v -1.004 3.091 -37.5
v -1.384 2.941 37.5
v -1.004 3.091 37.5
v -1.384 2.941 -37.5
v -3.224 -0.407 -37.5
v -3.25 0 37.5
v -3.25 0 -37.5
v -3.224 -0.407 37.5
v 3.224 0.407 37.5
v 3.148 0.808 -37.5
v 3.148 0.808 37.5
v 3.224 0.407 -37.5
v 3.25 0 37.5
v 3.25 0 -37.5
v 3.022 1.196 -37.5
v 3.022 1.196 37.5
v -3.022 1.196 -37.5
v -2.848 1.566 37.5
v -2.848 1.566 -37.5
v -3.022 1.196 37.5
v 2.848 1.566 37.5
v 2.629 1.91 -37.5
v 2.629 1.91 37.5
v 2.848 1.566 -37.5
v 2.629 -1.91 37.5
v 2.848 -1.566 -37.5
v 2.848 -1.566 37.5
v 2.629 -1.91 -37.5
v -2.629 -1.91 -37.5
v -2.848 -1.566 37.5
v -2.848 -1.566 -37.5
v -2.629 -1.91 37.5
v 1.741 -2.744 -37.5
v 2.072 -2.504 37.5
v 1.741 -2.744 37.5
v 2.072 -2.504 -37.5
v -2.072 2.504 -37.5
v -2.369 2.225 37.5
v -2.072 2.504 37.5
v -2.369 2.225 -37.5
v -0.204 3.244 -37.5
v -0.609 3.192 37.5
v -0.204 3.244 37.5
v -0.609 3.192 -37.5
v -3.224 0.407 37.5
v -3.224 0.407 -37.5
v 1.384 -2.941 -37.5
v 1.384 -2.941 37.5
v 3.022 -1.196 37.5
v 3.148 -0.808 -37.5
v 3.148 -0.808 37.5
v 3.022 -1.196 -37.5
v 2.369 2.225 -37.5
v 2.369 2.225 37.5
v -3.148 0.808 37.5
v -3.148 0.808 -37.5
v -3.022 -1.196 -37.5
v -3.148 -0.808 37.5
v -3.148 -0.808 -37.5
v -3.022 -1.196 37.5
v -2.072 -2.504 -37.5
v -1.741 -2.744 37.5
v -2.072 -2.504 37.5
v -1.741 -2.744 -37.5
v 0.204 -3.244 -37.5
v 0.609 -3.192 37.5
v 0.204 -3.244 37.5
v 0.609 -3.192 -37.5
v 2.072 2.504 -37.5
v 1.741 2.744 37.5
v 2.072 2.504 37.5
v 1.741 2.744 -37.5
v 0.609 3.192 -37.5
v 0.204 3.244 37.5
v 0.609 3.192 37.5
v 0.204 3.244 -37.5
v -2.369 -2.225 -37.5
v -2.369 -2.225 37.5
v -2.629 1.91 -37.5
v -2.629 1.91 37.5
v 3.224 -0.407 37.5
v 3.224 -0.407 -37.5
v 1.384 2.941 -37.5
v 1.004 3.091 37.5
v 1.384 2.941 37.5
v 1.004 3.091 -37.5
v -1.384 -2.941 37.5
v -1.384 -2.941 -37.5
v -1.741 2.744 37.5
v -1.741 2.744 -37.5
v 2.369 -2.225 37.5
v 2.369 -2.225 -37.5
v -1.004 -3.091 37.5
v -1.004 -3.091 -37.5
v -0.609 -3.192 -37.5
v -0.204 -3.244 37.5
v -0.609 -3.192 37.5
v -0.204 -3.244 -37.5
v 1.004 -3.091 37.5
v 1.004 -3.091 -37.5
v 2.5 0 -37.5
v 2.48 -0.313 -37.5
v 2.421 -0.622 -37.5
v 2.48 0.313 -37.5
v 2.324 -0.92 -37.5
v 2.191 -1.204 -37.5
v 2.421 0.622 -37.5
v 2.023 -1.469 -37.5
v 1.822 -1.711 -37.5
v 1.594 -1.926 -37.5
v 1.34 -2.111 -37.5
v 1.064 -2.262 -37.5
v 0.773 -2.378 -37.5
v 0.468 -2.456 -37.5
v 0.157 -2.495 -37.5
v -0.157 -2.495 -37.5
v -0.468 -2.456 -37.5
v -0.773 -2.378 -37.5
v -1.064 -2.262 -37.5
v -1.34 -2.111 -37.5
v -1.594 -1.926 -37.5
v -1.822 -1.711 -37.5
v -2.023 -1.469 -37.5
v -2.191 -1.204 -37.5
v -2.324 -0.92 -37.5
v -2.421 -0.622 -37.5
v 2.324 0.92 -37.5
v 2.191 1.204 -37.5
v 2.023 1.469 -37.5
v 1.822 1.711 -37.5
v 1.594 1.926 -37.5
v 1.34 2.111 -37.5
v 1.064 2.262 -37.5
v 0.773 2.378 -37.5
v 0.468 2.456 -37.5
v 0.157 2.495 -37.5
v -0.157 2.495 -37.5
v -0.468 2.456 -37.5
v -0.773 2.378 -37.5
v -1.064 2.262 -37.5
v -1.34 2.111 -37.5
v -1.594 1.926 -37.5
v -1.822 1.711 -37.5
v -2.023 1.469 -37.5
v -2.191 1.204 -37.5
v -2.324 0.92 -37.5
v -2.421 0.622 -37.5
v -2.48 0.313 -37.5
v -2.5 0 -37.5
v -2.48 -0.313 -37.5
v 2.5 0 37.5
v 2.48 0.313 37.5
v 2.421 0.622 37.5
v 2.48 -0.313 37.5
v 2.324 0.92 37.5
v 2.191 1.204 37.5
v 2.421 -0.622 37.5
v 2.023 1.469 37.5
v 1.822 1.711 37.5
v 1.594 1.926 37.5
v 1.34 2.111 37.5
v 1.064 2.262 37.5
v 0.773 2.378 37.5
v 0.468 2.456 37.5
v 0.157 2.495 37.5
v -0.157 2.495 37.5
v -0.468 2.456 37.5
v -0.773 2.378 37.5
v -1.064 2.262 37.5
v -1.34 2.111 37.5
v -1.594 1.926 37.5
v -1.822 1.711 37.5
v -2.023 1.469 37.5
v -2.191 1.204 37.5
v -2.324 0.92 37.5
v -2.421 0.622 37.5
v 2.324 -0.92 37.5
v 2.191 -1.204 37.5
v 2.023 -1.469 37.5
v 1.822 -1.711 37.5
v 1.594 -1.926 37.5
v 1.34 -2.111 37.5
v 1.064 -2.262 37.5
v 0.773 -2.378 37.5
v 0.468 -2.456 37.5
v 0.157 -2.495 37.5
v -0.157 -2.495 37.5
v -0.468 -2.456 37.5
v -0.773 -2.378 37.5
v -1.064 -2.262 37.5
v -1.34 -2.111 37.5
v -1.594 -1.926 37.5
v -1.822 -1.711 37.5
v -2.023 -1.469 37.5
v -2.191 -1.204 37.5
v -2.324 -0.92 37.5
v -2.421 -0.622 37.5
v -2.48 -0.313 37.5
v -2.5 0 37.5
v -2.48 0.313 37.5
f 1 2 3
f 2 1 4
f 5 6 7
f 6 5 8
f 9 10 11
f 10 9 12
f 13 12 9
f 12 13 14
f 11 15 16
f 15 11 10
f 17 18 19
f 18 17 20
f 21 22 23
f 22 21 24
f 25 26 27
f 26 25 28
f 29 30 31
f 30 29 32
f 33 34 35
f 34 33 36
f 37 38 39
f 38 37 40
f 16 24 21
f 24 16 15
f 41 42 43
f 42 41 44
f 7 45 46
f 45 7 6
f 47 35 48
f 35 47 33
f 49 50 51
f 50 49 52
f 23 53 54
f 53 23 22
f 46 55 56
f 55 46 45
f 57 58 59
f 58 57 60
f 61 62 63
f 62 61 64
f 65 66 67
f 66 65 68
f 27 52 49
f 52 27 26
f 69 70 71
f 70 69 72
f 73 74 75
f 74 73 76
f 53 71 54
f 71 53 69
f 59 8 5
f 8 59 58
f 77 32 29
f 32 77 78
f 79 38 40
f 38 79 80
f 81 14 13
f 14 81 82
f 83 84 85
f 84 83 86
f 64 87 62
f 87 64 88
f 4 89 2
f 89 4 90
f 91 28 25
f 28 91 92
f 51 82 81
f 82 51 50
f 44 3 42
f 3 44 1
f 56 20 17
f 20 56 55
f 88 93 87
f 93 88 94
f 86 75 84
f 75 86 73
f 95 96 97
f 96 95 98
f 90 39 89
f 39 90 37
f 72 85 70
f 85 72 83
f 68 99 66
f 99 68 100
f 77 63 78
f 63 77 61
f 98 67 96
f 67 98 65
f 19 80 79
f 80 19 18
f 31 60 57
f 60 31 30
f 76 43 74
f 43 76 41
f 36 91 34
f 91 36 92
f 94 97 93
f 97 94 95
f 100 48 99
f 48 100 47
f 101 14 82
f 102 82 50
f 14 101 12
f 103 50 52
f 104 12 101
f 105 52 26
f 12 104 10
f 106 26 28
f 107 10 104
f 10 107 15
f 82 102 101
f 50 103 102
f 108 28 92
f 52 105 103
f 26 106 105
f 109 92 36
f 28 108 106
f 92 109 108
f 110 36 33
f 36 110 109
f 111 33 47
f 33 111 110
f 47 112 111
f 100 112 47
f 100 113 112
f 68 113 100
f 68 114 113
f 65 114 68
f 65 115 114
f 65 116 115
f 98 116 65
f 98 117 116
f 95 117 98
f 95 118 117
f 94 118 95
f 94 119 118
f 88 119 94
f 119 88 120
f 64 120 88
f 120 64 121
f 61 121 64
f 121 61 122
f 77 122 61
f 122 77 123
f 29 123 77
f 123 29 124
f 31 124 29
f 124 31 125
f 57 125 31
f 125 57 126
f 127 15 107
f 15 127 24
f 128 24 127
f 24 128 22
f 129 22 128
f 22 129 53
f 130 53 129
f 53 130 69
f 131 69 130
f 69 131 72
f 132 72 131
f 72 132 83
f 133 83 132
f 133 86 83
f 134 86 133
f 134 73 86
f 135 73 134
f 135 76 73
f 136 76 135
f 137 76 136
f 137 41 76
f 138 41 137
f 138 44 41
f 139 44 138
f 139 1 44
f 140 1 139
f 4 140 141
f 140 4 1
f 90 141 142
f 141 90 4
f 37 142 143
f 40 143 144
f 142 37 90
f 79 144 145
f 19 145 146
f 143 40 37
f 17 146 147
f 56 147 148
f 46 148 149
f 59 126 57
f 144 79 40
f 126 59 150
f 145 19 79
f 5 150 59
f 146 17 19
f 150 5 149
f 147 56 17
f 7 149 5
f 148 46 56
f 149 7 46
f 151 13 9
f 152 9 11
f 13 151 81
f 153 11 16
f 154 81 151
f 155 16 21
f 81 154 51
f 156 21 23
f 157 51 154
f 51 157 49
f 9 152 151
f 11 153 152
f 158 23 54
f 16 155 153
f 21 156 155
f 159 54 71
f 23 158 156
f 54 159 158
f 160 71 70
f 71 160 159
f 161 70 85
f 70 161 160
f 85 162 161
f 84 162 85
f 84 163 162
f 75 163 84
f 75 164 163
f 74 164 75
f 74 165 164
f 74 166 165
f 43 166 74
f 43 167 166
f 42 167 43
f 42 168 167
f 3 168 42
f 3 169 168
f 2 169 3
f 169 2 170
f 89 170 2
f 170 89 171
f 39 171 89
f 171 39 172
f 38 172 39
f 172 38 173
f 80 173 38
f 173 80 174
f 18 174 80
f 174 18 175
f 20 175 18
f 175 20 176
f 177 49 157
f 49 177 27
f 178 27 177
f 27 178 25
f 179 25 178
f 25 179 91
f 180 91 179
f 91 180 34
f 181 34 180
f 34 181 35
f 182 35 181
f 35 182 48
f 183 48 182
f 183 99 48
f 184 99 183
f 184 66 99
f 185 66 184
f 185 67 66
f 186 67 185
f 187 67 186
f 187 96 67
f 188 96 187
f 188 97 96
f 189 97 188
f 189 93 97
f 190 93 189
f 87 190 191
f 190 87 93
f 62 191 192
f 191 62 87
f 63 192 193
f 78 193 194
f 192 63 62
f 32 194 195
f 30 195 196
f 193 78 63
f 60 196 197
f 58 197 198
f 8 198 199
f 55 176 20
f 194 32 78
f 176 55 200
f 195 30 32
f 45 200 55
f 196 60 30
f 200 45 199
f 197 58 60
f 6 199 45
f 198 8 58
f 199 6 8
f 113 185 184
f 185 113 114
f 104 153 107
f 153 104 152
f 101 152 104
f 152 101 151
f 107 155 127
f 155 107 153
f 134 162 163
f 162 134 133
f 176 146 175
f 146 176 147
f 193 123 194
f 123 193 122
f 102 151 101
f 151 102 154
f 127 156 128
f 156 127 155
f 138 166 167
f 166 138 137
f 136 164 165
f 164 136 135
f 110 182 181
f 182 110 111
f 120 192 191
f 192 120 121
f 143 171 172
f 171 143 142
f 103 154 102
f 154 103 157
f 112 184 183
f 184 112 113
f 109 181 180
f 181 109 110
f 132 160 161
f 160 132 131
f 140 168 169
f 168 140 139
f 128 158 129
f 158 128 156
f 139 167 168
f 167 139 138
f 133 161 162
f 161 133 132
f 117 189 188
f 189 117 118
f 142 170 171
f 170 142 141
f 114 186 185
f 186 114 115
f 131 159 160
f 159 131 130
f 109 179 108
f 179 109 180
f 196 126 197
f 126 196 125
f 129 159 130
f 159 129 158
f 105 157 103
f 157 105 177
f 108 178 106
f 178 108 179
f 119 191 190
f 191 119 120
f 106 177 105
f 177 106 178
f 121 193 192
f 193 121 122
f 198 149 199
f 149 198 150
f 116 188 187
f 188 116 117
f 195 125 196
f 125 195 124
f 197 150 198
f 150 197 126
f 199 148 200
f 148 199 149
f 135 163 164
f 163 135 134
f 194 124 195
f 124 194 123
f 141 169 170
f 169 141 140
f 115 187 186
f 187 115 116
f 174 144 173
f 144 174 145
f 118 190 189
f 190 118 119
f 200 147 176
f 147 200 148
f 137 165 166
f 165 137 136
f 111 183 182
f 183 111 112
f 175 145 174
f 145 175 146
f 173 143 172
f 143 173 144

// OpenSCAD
$fn = 50;


difference() {
	union() {
		translate(v = [0, 0, -37.5000000000]) {
			cylinder(h = 75, r = 3.2500000000);
		}
	}
	union() {
		translate(v = [0, 0, -100.0000000000]) {
			cylinder(h = 200, r = 2.5000000000);
		}
	}
}
